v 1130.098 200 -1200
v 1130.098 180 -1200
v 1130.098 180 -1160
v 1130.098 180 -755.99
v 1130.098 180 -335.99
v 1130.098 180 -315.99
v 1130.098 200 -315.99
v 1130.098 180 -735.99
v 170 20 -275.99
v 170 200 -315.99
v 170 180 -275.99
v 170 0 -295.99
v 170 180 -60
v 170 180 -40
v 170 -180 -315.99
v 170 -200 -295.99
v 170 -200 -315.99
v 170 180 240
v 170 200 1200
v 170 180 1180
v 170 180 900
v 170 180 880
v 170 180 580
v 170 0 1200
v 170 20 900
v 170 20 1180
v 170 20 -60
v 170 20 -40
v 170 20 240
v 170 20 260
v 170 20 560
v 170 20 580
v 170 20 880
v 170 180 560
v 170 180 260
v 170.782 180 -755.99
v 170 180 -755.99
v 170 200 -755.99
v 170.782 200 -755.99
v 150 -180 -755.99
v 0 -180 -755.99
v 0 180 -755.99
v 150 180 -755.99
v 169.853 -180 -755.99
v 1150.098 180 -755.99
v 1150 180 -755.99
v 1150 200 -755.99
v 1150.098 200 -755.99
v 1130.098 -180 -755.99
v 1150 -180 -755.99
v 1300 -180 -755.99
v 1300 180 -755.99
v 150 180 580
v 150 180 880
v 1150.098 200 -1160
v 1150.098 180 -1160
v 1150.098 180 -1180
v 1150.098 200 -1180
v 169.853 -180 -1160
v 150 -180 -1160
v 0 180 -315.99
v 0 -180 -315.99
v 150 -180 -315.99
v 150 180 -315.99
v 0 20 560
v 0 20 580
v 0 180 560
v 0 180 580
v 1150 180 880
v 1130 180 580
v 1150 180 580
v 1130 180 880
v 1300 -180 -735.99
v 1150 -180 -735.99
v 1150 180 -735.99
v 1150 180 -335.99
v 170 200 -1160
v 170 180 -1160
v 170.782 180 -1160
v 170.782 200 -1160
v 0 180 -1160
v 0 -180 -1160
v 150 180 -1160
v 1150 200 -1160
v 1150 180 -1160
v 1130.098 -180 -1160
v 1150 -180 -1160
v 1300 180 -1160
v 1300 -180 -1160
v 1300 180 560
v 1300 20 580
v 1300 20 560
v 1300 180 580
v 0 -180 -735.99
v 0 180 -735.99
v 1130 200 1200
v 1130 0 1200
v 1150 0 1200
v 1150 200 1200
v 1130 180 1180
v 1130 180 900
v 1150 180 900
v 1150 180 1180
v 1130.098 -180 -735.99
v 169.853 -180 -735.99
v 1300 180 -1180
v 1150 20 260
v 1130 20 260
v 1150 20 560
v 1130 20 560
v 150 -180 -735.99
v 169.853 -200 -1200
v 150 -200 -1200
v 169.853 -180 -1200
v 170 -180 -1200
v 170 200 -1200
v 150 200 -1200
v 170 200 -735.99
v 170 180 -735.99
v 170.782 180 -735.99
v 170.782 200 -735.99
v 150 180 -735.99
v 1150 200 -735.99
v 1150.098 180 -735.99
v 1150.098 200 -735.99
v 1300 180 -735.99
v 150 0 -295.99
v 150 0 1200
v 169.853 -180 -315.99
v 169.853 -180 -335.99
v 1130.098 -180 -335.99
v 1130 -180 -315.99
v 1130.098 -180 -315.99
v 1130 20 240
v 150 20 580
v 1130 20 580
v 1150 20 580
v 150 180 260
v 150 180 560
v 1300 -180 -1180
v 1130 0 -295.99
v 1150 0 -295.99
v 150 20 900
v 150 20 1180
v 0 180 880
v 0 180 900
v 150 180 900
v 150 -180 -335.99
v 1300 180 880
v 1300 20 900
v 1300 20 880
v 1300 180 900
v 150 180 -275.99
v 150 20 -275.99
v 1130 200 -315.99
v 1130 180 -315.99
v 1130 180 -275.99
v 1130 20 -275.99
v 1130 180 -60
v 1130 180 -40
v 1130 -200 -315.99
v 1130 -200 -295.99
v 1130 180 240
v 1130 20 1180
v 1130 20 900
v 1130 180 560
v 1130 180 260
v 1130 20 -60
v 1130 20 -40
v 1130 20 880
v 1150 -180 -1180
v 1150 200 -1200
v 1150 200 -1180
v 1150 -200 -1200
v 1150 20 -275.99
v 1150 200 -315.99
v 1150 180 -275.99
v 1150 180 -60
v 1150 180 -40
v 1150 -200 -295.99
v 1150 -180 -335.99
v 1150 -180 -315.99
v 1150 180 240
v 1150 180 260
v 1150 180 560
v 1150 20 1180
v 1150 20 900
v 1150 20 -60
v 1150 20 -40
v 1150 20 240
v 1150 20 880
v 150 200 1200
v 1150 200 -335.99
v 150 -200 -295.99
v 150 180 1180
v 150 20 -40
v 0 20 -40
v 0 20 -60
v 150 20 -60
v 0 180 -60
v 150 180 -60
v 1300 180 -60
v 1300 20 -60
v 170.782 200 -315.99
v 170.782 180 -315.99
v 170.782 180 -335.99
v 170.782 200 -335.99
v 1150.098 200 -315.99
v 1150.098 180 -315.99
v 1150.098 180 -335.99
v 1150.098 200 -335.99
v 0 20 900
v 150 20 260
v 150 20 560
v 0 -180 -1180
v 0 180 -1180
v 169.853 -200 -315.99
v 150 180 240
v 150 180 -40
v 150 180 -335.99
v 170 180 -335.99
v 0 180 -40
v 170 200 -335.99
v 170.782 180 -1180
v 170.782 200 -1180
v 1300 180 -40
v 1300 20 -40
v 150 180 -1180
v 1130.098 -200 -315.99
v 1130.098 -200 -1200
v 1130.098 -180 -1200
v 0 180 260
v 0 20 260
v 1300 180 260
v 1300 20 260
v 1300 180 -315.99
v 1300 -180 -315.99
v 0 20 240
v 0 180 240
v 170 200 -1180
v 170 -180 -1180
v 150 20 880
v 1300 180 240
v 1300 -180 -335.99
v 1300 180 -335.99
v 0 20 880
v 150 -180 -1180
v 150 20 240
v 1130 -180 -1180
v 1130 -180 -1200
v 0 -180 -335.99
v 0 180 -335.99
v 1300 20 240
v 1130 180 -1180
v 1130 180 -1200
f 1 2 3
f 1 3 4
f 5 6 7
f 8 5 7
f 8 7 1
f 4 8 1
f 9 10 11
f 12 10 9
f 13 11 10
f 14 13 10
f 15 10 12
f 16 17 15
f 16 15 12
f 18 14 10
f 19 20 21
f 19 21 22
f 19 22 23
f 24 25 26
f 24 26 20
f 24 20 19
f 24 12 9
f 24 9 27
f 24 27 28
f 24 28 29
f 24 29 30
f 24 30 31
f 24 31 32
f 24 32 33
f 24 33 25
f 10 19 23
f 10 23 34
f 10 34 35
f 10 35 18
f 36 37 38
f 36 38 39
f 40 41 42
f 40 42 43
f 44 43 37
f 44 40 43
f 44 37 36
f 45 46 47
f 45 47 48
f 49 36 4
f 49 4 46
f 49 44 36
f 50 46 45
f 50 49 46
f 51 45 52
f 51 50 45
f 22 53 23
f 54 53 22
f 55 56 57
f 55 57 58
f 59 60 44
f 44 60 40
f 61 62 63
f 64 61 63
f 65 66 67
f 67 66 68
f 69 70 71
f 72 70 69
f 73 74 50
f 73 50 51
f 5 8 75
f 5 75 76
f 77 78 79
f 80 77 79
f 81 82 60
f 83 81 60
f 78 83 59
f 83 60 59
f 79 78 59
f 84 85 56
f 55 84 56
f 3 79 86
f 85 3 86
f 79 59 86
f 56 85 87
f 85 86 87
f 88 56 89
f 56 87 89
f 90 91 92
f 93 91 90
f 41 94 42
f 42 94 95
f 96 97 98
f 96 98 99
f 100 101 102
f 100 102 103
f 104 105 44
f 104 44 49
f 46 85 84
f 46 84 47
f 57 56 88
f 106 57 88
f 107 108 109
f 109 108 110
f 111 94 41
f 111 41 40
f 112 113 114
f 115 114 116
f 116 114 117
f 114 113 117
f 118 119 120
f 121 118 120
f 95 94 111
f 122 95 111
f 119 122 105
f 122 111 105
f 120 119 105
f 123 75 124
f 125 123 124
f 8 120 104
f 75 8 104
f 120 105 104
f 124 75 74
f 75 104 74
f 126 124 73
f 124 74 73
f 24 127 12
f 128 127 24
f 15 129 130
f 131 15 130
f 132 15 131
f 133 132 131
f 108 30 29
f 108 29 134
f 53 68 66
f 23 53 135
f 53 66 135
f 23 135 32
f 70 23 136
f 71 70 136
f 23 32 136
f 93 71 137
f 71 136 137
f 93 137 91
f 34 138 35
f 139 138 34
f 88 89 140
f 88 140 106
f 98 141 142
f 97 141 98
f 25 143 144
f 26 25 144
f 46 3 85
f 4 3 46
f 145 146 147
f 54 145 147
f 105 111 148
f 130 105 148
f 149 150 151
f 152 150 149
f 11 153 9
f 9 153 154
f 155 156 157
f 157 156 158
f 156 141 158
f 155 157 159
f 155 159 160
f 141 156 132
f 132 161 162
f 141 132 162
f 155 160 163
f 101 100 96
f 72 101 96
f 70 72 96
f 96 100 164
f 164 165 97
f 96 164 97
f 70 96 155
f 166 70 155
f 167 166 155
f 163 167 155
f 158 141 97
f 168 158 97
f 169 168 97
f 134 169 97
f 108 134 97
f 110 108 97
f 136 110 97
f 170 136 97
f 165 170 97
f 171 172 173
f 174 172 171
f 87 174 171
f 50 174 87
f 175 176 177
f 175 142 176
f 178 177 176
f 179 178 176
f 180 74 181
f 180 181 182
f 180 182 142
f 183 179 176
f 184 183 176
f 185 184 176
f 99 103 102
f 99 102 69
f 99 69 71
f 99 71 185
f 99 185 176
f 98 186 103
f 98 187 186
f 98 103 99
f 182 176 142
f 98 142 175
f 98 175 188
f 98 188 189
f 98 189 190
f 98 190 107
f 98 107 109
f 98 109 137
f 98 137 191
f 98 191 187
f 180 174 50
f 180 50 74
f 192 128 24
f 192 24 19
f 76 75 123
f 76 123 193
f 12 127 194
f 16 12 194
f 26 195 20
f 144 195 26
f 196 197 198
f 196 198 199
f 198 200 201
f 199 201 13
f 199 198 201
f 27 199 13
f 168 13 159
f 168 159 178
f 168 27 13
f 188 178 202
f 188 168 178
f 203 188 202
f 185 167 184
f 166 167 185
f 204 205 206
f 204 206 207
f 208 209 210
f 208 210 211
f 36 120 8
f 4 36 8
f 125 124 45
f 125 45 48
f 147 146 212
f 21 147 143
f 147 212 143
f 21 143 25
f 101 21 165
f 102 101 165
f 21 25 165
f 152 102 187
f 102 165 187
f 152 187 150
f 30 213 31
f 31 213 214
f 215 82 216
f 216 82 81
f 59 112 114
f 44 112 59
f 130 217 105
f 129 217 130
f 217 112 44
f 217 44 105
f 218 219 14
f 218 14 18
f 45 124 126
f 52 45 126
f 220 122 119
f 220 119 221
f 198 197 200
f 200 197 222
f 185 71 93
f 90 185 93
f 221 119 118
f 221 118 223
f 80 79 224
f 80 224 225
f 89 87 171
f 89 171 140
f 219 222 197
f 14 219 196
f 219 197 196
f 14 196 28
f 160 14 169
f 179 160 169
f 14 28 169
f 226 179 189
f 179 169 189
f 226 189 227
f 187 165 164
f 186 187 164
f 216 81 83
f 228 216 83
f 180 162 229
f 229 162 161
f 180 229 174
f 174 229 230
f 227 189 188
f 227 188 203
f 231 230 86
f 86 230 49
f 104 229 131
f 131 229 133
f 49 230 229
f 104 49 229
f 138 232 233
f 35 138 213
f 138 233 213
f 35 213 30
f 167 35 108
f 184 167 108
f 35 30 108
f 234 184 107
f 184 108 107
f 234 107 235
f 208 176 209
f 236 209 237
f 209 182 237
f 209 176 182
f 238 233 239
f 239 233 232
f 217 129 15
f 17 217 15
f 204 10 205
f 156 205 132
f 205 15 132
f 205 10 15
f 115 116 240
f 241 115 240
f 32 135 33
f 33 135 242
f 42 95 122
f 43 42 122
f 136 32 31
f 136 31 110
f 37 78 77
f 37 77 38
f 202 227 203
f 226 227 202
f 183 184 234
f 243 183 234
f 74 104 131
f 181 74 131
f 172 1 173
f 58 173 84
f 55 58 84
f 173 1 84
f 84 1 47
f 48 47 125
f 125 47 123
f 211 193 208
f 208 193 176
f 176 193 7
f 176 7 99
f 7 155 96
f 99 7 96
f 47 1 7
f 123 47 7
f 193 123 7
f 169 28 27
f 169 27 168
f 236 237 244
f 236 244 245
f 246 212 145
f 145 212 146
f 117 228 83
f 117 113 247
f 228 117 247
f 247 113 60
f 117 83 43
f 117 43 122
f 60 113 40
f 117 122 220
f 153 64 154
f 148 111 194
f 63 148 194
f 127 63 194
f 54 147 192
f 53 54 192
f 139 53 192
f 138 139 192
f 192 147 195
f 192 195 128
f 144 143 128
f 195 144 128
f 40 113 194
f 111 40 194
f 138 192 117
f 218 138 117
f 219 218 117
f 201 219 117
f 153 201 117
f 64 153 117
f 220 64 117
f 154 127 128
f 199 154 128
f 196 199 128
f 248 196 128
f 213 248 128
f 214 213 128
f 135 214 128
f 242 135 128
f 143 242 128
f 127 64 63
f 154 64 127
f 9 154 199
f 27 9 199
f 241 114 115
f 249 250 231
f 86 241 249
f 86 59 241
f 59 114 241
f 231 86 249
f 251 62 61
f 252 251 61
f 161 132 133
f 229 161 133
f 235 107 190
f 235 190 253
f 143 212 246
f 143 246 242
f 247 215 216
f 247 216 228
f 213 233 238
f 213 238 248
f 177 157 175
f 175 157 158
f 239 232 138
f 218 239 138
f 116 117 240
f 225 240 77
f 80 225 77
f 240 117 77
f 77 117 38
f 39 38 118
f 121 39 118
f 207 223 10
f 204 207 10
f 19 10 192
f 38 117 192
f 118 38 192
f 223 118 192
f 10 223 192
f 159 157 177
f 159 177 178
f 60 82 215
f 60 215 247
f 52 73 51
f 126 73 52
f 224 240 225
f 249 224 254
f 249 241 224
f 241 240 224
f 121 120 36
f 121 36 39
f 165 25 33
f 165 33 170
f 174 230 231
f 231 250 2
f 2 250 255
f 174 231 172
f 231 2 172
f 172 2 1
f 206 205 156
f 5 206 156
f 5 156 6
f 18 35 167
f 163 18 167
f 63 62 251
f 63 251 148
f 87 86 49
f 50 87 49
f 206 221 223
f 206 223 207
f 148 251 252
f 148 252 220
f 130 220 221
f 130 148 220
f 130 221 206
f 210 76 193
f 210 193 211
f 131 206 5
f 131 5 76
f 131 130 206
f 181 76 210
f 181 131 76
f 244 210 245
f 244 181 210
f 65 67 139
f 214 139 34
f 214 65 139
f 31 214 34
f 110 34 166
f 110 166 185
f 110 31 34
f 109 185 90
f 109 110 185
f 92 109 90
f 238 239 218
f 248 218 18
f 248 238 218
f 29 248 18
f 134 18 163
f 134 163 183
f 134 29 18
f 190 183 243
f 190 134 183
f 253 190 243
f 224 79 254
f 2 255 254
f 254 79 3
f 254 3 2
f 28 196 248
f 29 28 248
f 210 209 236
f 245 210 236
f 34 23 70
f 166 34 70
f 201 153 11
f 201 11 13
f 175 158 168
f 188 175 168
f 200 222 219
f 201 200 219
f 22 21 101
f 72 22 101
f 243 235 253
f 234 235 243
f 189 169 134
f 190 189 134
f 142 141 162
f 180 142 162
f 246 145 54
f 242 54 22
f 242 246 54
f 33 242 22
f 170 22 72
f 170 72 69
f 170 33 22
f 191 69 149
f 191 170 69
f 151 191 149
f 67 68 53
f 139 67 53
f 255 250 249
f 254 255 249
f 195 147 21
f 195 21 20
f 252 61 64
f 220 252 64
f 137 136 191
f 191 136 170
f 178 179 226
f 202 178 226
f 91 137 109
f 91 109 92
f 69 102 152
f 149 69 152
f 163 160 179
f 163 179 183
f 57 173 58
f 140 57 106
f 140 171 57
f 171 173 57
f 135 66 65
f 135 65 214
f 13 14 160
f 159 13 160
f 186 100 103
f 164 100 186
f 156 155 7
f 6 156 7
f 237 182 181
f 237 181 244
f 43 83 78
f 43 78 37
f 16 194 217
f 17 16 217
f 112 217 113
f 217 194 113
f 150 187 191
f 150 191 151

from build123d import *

# Parameters (mm, degrees)
F0_W      = 200
F0_H      = 1495.990298
F1_DEPTH  = 1300
F2_W      = 150
F2_H      = 300
F2_W_2    = 960
F2_H_2    = 280
F2_H_3    = 235.990298
F3_DEPTH  = 200
F4_W      = 160
F4_H      = 280
F4_H_2    = 300
F4_H_3    = 215.990298
F5_DEPTH  = 1150.001
F6_W      = 150
F6_H      = 20
F6_W_2    = 960
F7_DEPTH  = 1195.990298
F8_W      = 150
F8_H      = 404.009702
F8_H_2    = 400
F8_W_2    = 960
F8_H_3    = 20
F9_DEPTH  = 400.001
F10_W     = 360
F10_H     = 400
F10_H_2   = 404.009702
F11_DEPTH = 1150.001
F12_W     = 150
F12_H     = 20
F12_W_2   = 959.315732
F12_W_3   = 960.244403
F13_DEPTH = 884.010702


with BuildPart() as f1:
    # F0 (on Right) → F1 (new body)
    with BuildSketch(Plane.YZ):
        Polygon((-200, -1200), (200, -1200), (200, -295.990298), (0, -295.990298), (-200, -295.990298), align=None)
        with Locations((100, 452.004851)):
            Rectangle(F0_W, F0_H)
    extrude(amount=F1_DEPTH)

    # F2 (on face) → F3 (cut, through all)
    with BuildSketch(Plane.XZ):
        with Locations((75, 1050)):
            Rectangle(F2_W, F2_H)
        with Locations((650, 1050)):
            Rectangle(F2_W_2, F2_H)
        with Locations((1225, 1050)):
            Rectangle(F2_W, F2_H)
        with Locations((75, 730)):
            Rectangle(F2_W, F2_H)
        with Locations((650, 730)):
            Rectangle(F2_W_2, F2_H)
        with Locations((1225, 730)):
            Rectangle(F2_W, F2_H)
        with Locations((75, 410)):
            Rectangle(F2_W, F2_H)
        with Locations((650, 410)):
            Rectangle(F2_W_2, F2_H)
        with Locations((1225, 410)):
            Rectangle(F2_W, F2_H)
        with Locations((75, 100)):
            Rectangle(F2_W, F2_H_2)
        with Locations((650, 100)):
            Rectangle(F2_W_2, F2_H_2)
        with Locations((1225, 100)):
            Rectangle(F2_W, F2_H_2)
        with Locations((75, -177.995149)):
            Rectangle(F2_W, F2_H_3)
        with Locations((650, -177.995149)):
            Rectangle(F2_W_2, F2_H_3)
        with Locations((1225, -177.995149)):
            Rectangle(F2_W, F2_H_3)
    extrude(amount=-F3_DEPTH, mode=Mode.SUBTRACT)

    # F4 (on face) → F5 (cut, through all)
    with BuildSketch(Plane(origin=(150, 0, 0), x_dir=(0, -1, 0), z_dir=(-1, 0, 0))):
        with Locations((-100, 1040)):
            Rectangle(F4_W, F4_H)
        with Locations((-100, 730)):
            Rectangle(F4_W, F4_H_2)
        with Locations((-100, 410)):
            Rectangle(F4_W, F4_H_2)
        with Locations((-100, 100)):
            Rectangle(F4_W, F4_H)
        with Locations((-100, -167.995149)):
            Rectangle(F4_W, F4_H_3)
    extrude(amount=-F5_DEPTH, mode=Mode.SUBTRACT)

    # F6 (on face) → F7 (cut, through all)
    with BuildSketch(Plane.XY.offset(900)):
        with Locations((75, 190)):
            Rectangle(F6_W, F6_H)
        with Locations((75, 10)):
            Rectangle(F6_W, F6_H)
        with Locations((1225, 190)):
            Rectangle(F6_W, F6_H)
        with Locations((1225, 10)):
            Rectangle(F6_W, F6_H)
        with Locations((650, 190)):
            Rectangle(F6_W_2, F6_H)
        with Locations((650, 10)):
            Rectangle(F6_W_2, F6_H)
    extrude(amount=-F7_DEPTH, mode=Mode.SUBTRACT)

    # F8 (on face) → F9 (cut, through all)
    with BuildSketch(Plane.XZ.offset(200)):
        with Locations((1225, -957.995149)):
            Rectangle(F8_W, F8_H)
        with Locations((1225, -535.990298)):
            Rectangle(F8_W, F8_H_2)
        with Locations((650, -535.990298)):
            Rectangle(F8_W_2, F8_H_2)
        with Locations((650, -957.995149)):
            Rectangle(F8_W_2, F8_H)
        with Locations((75, -535.990298)):
            Rectangle(F8_W, F8_H_2)
        with Locations((75, -957.995149)):
            Rectangle(F8_W, F8_H)
        with Locations((75, -305.990298)):
            Rectangle(F8_W, F8_H_3)
        with Locations((650, -305.990298)):
            Rectangle(F8_W_2, F8_H_3)
        with Locations((1225, -305.990298)):
            Rectangle(F8_W, F8_H_3)
        with Locations((75, -1190)):
            Rectangle(F8_W, F8_H_3)
        with Locations((650, -1190)):
            Rectangle(F8_W_2, F8_H_3)
        with Locations((1225, -1190)):
            Rectangle(F8_W, F8_H_3)
    extrude(amount=-F9_DEPTH, mode=Mode.SUBTRACT)

    # F10 (on face) → F11 (cut, through all)
    with BuildSketch(Plane(origin=(150, 0, 0), x_dir=(0, -1, 0), z_dir=(-1, 0, 0))):
        with Locations((0, -535.990298)):
            Rectangle(F10_W, F10_H)
        with Locations((0, -957.995149)):
            Rectangle(F10_W, F10_H_2)
    extrude(amount=-F11_DEPTH, mode=Mode.SUBTRACT)

    # F12 (on face) → F13 (cut, through all)
    with BuildSketch(Plane.XY.offset(-315.990298)):
        with Locations((75, 190)):
            Rectangle(F12_W, F12_H)
        with Locations((75, -190)):
            Rectangle(F12_W, F12_H)
        with Locations((650.439762, 190)):
            Rectangle(F12_W_2, F12_H)
        with Locations((1225.097628, 190)):
            Rectangle(F12_W, F12_H)
        with Locations((1225, -190)):
            Rectangle(F12_W, F12_H)
        with Locations((649.975427, -190)):
            Rectangle(F12_W_3, F12_H)
    extrude(amount=-F13_DEPTH, mode=Mode.SUBTRACT)


solid = f1.part
